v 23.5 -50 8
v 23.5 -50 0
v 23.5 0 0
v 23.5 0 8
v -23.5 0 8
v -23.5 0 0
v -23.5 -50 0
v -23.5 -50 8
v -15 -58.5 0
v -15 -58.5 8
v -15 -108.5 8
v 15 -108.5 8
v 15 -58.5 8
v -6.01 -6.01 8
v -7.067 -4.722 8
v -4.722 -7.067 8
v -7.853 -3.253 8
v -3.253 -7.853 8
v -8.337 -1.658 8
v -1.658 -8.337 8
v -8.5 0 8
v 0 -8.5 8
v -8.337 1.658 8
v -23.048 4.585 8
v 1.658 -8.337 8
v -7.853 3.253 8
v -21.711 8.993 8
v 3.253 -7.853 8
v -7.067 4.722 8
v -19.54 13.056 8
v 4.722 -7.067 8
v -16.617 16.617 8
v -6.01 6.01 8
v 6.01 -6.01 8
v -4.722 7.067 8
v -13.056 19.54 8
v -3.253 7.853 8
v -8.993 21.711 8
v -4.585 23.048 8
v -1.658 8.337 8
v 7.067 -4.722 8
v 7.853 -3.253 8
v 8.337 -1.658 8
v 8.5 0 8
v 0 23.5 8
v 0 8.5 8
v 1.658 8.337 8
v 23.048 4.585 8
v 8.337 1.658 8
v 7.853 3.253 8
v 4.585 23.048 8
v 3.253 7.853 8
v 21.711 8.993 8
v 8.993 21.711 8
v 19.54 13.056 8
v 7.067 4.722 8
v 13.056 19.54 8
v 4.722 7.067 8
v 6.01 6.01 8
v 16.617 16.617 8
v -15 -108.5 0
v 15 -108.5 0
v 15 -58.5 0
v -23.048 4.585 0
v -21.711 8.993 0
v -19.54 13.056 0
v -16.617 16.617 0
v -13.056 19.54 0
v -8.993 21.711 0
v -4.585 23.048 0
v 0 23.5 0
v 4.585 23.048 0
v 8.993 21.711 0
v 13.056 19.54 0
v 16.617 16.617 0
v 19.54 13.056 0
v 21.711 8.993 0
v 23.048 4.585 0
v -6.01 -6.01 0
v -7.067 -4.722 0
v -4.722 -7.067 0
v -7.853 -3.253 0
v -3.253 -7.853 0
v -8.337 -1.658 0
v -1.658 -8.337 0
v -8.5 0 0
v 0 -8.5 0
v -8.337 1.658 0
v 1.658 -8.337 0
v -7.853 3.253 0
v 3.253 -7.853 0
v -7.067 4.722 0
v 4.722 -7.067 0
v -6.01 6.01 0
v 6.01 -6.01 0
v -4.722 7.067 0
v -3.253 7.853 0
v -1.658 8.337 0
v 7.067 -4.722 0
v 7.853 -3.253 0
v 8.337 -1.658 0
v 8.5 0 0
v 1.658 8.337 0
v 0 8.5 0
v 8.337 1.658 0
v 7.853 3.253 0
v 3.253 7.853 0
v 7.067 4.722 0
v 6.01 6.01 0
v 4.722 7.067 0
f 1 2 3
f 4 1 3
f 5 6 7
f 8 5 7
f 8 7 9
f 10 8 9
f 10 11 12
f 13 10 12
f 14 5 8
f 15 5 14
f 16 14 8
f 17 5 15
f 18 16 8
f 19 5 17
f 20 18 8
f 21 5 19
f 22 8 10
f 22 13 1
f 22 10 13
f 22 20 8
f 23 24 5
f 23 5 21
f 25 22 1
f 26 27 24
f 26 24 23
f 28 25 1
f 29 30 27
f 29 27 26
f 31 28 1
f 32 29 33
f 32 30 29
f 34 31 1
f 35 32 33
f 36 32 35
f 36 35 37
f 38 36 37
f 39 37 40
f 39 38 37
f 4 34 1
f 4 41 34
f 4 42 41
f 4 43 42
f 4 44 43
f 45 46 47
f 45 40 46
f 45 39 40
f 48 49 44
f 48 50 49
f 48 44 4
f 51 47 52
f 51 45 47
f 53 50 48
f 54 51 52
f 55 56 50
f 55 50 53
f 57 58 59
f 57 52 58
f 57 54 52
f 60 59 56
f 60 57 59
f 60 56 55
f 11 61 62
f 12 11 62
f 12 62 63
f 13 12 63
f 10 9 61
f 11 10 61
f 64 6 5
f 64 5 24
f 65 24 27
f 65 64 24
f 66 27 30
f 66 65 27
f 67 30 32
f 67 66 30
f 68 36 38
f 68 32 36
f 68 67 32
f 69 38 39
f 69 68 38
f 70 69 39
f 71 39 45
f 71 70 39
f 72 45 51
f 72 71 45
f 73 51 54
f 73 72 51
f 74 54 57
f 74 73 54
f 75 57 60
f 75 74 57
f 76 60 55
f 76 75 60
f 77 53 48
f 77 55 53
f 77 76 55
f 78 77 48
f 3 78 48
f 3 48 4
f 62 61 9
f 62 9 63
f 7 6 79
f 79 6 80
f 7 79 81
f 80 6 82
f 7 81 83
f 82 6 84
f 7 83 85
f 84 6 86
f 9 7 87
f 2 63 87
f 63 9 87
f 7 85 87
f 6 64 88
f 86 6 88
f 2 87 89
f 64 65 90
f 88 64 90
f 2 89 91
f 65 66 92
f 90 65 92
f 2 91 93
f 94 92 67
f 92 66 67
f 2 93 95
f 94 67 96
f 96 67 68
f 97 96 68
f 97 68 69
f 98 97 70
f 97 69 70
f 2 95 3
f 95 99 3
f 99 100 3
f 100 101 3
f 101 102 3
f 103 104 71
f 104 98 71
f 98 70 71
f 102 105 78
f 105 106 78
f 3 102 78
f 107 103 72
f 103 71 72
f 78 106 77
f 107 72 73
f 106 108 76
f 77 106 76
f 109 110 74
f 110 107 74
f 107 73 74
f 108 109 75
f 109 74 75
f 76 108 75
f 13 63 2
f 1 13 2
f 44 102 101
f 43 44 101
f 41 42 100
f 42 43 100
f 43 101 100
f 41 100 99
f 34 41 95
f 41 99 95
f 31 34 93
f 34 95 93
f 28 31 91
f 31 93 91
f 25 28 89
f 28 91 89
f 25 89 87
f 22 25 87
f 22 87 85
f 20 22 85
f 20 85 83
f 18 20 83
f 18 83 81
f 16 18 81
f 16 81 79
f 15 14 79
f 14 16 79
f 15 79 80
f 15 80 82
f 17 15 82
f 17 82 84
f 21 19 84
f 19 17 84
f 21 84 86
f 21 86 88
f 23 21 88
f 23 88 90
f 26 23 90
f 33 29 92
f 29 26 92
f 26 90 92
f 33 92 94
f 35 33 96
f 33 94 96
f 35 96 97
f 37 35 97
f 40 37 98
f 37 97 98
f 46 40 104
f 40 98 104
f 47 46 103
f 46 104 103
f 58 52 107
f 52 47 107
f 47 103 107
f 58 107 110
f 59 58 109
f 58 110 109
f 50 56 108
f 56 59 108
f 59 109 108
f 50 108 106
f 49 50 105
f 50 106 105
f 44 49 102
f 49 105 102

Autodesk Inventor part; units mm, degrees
ref_plane "YZ Plane" through (0, 0, 0) normal (1, 0, 0) x (0, 1, 0)
ref_plane "XZ Plane" through (0, 0, 0) normal (0, 1, 0) x (-1, 0, 0)
ref_plane "XY Plane" through (0, 0, 0) normal (0, 0, 1) x (1, 0, 0)
sketch "Sketch1" plane through (0, 0, 0) normal (0, 0, 1) x (1, 0, 0)
  circle A0 centre (0, 0) radius 8.5
  arc A1 (23.5, 0) -> (-23.5, 0) centre (0, 0) ccw
  line L0 (-23.5, 0) -> (-23.5, -50)
  line L1 (-23.5, -50) -> (-15, -58.5)
  line L2 (-15, -58.5) -> (-15, -108.5)
  line L3 (-15, -108.5) -> (15, -108.5)
  line L4 (15, -108.5) -> (15, -58.5)
  line L5 (15, -58.5) -> (23.5, -50)
  line L6 (23.5, -50) -> (23.5, 0)
  line L7 (0, 0) -> (0, -108.5) construction
  dimension "d162" = 17
  dimension "d163" = 15
  dimension "d164" = 50
  dimension "d165" = 45
  dimension "d166" = 50
  dimension "d167" = 30
extrude "Plate5" add sketch "Sketch1" along normal blind 8
properties part number "PNS-073 stretch tear" material "Stainless Steel"
